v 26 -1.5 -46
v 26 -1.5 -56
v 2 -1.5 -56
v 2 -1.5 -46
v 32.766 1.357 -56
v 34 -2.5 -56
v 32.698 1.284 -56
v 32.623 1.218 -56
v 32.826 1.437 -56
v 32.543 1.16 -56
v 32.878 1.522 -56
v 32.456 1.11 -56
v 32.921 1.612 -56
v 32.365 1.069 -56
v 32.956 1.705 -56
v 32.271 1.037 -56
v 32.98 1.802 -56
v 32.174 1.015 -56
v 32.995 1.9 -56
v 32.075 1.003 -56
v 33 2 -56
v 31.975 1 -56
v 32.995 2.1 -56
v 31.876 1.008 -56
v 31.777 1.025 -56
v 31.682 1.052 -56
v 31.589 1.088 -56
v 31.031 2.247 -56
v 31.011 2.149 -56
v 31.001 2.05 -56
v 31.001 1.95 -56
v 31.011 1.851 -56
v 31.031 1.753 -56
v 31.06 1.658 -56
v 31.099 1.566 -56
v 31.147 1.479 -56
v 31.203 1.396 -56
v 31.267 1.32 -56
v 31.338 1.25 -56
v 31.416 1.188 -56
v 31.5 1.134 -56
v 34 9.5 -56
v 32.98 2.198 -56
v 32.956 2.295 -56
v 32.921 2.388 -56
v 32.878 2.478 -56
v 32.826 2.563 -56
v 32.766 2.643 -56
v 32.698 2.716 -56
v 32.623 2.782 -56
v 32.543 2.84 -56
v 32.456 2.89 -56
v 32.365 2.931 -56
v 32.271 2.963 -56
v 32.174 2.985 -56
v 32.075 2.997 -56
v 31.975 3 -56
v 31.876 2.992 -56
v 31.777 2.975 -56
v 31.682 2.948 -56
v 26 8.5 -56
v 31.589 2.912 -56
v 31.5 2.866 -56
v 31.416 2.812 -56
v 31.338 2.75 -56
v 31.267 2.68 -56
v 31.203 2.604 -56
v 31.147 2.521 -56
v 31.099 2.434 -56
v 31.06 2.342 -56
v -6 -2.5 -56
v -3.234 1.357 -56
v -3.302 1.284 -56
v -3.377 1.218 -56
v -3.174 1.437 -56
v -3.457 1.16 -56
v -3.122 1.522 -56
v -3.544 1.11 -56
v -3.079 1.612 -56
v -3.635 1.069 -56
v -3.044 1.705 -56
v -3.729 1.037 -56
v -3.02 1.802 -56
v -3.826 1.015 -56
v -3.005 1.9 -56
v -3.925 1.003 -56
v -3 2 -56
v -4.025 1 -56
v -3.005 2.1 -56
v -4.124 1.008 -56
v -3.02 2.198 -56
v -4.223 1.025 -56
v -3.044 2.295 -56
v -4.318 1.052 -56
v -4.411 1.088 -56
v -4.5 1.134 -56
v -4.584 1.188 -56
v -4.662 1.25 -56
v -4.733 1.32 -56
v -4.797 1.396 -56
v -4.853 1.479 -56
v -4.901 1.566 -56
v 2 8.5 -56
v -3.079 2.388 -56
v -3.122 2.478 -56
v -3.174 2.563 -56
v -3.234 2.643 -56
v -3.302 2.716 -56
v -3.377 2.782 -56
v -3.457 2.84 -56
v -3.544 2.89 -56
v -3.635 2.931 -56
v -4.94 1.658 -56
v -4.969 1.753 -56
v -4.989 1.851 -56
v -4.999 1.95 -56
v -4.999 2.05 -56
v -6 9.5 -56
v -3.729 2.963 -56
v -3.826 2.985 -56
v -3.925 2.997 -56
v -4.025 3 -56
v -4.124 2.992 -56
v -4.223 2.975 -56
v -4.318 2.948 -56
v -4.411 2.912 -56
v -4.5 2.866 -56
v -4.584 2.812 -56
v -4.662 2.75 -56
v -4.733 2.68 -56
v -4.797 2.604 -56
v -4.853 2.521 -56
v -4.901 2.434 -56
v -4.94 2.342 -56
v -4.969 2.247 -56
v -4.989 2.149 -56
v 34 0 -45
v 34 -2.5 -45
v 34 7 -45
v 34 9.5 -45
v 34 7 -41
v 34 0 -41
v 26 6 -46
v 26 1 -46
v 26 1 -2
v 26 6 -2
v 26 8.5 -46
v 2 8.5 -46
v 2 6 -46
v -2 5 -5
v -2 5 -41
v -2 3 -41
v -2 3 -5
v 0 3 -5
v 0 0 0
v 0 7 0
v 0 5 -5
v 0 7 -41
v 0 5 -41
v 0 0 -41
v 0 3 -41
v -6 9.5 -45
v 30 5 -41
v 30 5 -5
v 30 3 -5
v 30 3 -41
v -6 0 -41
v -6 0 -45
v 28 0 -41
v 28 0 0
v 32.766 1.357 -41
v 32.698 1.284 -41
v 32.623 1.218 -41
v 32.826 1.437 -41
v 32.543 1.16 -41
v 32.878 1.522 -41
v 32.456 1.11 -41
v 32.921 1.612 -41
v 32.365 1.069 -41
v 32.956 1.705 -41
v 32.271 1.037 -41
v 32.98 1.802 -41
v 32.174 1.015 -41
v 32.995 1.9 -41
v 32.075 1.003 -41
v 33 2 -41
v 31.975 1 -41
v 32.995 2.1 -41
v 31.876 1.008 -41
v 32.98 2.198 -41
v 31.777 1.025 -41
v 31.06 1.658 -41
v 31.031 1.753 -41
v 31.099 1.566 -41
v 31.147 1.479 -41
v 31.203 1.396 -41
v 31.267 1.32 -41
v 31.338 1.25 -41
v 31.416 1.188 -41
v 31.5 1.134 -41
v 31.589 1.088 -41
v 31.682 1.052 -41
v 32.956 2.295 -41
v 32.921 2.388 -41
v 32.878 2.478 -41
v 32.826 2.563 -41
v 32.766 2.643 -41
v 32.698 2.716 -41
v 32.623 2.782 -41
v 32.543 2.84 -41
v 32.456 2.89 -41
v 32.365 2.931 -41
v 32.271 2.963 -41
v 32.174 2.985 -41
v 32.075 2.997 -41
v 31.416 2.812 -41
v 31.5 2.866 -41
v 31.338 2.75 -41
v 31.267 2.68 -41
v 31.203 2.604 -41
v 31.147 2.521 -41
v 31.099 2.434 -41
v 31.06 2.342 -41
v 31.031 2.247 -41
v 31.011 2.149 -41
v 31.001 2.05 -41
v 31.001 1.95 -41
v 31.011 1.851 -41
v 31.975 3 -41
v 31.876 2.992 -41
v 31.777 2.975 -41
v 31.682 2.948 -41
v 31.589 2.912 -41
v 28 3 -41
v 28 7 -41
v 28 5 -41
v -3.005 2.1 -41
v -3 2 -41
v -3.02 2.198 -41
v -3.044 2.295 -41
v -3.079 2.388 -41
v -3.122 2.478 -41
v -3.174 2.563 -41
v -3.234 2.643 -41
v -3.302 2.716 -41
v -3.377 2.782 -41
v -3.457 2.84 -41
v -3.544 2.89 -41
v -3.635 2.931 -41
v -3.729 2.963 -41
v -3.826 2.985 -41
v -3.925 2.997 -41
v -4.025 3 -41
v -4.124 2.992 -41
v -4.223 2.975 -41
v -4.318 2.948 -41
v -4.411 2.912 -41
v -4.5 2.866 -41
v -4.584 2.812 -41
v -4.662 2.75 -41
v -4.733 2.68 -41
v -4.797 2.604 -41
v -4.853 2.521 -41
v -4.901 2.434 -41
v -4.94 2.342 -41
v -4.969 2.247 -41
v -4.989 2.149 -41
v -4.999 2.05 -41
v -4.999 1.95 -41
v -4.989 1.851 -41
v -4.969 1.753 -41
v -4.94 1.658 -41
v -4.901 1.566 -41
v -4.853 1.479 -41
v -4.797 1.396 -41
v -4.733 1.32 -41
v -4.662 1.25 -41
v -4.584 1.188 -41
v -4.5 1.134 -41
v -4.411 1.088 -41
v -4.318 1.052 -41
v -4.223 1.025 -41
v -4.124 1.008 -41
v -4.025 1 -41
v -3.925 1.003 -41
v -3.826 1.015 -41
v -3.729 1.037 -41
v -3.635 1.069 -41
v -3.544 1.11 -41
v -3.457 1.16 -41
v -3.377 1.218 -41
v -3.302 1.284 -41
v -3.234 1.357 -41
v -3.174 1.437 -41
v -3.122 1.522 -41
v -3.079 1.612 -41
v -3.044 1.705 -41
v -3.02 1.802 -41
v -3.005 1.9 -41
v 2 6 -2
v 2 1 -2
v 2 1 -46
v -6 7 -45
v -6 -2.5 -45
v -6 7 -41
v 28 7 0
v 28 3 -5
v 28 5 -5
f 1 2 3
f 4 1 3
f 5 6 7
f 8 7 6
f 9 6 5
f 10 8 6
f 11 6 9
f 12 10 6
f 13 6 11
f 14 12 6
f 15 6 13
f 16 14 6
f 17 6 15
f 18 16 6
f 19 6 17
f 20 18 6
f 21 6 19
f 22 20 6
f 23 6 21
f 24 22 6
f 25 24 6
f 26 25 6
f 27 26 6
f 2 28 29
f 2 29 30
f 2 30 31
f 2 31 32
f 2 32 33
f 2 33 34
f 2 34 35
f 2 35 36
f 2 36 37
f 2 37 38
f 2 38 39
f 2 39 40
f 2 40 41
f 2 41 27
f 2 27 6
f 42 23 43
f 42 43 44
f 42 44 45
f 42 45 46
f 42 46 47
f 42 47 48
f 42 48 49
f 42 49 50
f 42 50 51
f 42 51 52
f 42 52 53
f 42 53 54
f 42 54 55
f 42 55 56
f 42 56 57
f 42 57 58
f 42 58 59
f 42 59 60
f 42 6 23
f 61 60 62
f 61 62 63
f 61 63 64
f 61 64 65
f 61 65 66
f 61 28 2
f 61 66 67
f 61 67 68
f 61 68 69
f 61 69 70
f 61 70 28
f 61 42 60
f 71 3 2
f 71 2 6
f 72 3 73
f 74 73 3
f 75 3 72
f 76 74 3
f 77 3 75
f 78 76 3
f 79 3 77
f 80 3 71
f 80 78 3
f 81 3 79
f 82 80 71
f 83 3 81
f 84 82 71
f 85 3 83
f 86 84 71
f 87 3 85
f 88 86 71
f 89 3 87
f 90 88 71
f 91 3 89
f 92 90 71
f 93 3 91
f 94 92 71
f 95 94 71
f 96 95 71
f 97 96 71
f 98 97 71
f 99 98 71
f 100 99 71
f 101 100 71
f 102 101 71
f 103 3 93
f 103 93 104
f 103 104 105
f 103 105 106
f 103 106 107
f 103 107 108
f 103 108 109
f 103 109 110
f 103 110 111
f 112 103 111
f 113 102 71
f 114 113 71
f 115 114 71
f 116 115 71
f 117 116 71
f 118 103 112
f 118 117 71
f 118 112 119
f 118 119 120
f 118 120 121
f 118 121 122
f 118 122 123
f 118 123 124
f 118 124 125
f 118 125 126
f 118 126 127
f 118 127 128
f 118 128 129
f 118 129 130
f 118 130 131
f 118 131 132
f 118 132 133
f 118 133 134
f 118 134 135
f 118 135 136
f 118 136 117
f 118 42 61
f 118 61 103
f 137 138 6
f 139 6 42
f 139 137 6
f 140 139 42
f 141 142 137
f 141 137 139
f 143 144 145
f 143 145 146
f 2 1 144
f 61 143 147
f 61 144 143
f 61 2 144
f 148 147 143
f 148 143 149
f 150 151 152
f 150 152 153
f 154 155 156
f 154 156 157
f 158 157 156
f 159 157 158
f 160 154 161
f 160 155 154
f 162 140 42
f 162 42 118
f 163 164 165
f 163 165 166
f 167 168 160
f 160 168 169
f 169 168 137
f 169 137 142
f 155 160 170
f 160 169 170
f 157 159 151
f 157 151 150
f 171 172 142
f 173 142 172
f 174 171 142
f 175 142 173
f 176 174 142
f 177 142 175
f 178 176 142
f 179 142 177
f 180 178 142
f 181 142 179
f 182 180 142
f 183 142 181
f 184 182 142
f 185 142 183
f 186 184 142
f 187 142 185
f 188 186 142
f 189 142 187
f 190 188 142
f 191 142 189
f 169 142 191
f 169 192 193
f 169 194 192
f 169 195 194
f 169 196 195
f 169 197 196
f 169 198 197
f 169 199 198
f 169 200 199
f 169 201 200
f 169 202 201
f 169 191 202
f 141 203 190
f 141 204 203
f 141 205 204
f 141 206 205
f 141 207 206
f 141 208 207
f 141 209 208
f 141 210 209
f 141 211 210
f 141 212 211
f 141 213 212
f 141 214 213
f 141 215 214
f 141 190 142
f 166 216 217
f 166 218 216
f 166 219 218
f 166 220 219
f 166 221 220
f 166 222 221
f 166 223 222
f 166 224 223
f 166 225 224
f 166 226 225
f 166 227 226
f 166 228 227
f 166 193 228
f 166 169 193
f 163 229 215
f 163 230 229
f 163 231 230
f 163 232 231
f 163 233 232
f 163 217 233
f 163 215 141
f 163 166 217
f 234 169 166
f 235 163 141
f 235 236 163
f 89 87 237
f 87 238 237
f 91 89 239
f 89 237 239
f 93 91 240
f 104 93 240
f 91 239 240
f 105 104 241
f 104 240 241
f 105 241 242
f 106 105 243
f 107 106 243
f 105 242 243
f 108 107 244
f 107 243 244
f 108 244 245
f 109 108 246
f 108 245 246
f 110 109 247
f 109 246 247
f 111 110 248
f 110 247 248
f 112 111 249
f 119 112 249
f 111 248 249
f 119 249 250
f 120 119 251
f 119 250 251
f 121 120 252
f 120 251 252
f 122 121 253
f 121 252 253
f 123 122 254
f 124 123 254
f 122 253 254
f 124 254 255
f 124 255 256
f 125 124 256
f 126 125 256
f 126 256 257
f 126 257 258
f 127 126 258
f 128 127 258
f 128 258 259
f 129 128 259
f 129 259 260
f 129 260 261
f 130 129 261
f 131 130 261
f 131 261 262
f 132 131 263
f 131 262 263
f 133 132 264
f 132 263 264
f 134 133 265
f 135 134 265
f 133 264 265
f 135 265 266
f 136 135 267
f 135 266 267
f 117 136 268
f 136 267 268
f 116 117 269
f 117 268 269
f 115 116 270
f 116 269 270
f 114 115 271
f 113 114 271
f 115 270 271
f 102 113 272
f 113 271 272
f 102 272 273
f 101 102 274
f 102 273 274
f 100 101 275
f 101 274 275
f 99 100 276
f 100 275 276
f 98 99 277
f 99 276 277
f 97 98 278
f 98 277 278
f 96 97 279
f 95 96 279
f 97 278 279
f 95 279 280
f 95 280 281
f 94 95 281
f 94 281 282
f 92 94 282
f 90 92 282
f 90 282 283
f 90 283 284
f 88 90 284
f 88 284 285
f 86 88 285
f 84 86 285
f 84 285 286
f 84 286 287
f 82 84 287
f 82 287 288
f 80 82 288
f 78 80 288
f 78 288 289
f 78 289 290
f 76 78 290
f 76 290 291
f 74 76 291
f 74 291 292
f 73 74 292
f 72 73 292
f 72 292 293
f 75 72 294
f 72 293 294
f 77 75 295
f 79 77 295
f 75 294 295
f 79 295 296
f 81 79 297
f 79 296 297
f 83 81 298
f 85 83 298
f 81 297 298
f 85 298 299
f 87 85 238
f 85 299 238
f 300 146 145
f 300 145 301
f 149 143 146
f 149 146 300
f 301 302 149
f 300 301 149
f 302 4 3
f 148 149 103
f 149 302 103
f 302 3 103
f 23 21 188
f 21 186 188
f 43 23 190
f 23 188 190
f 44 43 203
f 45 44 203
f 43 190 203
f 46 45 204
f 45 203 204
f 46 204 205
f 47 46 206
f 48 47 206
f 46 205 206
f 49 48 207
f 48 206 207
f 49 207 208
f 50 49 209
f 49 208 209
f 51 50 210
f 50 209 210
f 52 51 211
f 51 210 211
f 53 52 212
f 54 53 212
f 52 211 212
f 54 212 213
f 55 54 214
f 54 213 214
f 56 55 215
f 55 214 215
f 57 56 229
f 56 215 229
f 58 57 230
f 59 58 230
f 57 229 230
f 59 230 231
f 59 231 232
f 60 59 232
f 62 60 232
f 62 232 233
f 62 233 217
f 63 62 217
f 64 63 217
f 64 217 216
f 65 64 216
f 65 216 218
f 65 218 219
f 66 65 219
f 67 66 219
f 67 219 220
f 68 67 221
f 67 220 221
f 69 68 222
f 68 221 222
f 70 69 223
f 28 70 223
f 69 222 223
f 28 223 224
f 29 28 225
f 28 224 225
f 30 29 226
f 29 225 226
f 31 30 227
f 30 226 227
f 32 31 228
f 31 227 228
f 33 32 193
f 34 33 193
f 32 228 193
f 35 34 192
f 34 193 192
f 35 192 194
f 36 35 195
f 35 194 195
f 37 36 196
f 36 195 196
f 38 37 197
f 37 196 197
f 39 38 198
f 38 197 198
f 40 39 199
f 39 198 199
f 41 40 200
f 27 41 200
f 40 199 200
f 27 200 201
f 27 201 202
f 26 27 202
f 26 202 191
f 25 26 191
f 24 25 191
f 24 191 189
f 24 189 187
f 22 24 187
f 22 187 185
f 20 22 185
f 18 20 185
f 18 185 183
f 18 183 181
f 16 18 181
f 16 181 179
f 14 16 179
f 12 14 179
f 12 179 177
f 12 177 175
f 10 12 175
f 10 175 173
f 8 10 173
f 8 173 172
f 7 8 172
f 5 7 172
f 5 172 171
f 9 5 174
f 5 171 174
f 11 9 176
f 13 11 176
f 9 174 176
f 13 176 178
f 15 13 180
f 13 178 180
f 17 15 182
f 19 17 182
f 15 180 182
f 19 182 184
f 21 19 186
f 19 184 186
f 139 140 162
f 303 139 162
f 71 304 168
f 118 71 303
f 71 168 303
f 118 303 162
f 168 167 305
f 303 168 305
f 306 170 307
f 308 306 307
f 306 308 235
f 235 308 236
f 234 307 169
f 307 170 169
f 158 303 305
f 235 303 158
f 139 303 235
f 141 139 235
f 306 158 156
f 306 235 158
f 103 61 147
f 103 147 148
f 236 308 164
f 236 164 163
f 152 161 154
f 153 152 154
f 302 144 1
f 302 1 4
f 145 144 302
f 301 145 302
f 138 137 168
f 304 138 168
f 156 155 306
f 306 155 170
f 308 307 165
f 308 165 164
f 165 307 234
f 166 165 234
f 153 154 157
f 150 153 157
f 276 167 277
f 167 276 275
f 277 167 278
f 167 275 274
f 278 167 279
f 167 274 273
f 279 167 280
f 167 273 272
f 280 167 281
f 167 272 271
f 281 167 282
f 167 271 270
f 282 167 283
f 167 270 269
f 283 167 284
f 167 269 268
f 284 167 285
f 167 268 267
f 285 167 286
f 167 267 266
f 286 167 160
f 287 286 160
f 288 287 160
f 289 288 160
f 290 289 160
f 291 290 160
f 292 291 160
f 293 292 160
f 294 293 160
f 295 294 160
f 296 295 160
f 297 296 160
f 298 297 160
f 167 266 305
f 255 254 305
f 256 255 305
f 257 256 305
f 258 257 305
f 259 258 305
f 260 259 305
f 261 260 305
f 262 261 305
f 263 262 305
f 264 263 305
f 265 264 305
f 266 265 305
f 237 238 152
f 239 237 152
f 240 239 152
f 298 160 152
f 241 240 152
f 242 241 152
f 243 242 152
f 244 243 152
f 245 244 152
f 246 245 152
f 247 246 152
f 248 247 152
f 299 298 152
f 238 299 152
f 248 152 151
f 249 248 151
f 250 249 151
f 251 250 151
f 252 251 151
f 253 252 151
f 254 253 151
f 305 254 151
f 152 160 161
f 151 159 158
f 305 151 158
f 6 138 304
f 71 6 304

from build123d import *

# Parameters (mm, degrees)
SKETCH1_W            = 28
SKETCH1_H            = 45
BOSS_EXTRUDE1_DEPTH  = 7
SKETCH7_W            = 4
SKETCH7_H            = 7
BOSS_EXTRUDE2_DEPTH  = 6
SKETCH6_W            = 4
SKETCH6_H            = 7
BOSS_EXTRUDE3_DEPTH  = 6
SKETCH10_R           = 1
CUT_EXTRUDE1_DEPTH   = 6
SKETCH11_W           = 24
SKETCH11_H           = 5
CUT_EXTRUDE2_DEPTH   = 43
SKETCH16_W           = 36
SKETCH16_H           = 2
BOSS_EXTRUDE7_DEPTH  = 2
SKETCH17_W           = 36
SKETCH17_H           = 2
BOSS_EXTRUDE8_DEPTH  = 2
SKETCH30_W           = 40
SKETCH30_H           = 12
BOSS_EXTRUDE13_DEPTH = 11
SKETCH31_W           = 24
SKETCH31_H           = 10
CUT_EXTRUDE11_DEPTH  = 10
SKETCH32_W           = 24
SKETCH32_H           = 5
CUT_EXTRUDE12_DEPTH  = 1
SKETCH33_R           = 1
CUT_EXTRUDE13_DEPTH  = 11
SKETCH34_R           = 1
CUT_EXTRUDE14_DEPTH  = 11


with BuildPart() as part:
    # Sketch1 → Boss-Extrude1 (new body)
    with BuildSketch(Plane(origin=(0, 0, 0), x_dir=(1, 0, 0), z_dir=(0, 1, 0))):
        with Locations((14, 22.5)):
            Rectangle(SKETCH1_W, SKETCH1_H)
    extrude(amount=BOSS_EXTRUDE1_DEPTH)

    # Sketch7 → Boss-Extrude2 (add)
    with BuildSketch(Plane(origin=(28, 0, 0), x_dir=(0, 0, -1), z_dir=(1, 0, 0))):
        with Locations((43, 3.5)):
            Rectangle(SKETCH7_W, SKETCH7_H)
    extrude(amount=BOSS_EXTRUDE2_DEPTH)

    # Sketch6 → Boss-Extrude3 (add)
    with BuildSketch(Plane.ZY):
        with Locations((-43, 3.5)):
            Rectangle(SKETCH6_W, SKETCH6_H)
    extrude(amount=BOSS_EXTRUDE3_DEPTH)

    # Sketch10 → Cut-Extrude1 (cut)
    with BuildSketch(Plane.XY.offset(-41)):
        with Locations((-4, 2)):
            Circle(SKETCH10_R)
        with Locations((32, 2)):
            Circle(SKETCH10_R)
    extrude(amount=-CUT_EXTRUDE1_DEPTH, mode=Mode.SUBTRACT)

    # Sketch11 → Cut-Extrude2 (cut)
    with BuildSketch(Plane(origin=(0, 0, -45), x_dir=(-1, 0, 0), z_dir=(0, 0, -1))):
        with Locations((-14, 3.5)):
            Rectangle(SKETCH11_W, SKETCH11_H)
    extrude(amount=-CUT_EXTRUDE2_DEPTH, mode=Mode.SUBTRACT)

    # Sketch16 → Boss-Extrude7 (add)
    with BuildSketch(Plane.ZY):
        with Locations((-23, 4)):
            Rectangle(SKETCH16_W, SKETCH16_H)
    extrude(amount=BOSS_EXTRUDE7_DEPTH)

    # Sketch17 → Boss-Extrude8 (add)
    with BuildSketch(Plane(origin=(28, 0, 0), x_dir=(0, 0, -1), z_dir=(1, 0, 0))):
        with Locations((23, 4)):
            Rectangle(SKETCH17_W, SKETCH17_H)
    extrude(amount=BOSS_EXTRUDE8_DEPTH)

    # Sketch30 → Boss-Extrude13 (add)
    with BuildSketch(Plane(origin=(0, 0, -45), x_dir=(-1, 0, 0), z_dir=(0, 0, -1))):
        with Locations((-14, 3.5)):
            Rectangle(SKETCH30_W, SKETCH30_H)
    extrude(amount=BOSS_EXTRUDE13_DEPTH)

    # Sketch31 → Cut-Extrude11 (cut)
    with BuildSketch(Plane(origin=(0, 0, -56), x_dir=(-1, 0, 0), z_dir=(0, 0, -1))):
        with Locations((-14, 3.5)):
            Rectangle(SKETCH31_W, SKETCH31_H)
    extrude(amount=-CUT_EXTRUDE11_DEPTH, mode=Mode.SUBTRACT)

    # Sketch32 → Cut-Extrude12 (cut)
    with BuildSketch(Plane(origin=(0, 0, -46), x_dir=(-1, 0, 0), z_dir=(0, 0, -1))):
        with Locations((-14, 3.5)):
            Rectangle(SKETCH32_W, SKETCH32_H)
    extrude(amount=-CUT_EXTRUDE12_DEPTH, mode=Mode.SUBTRACT)

    # Sketch33 → Cut-Extrude13 (cut)
    with BuildSketch(Plane.XY.offset(-45)):
        with Locations((32, 2)):
            Circle(SKETCH33_R)
    extrude(amount=-CUT_EXTRUDE13_DEPTH, mode=Mode.SUBTRACT)

    # Sketch34 → Cut-Extrude14 (cut)
    with BuildSketch(Plane.XY.offset(-45)):
        with Locations((-4, 2)):
            Circle(SKETCH34_R)
    extrude(amount=-CUT_EXTRUDE14_DEPTH, mode=Mode.SUBTRACT)


solid = part.part
